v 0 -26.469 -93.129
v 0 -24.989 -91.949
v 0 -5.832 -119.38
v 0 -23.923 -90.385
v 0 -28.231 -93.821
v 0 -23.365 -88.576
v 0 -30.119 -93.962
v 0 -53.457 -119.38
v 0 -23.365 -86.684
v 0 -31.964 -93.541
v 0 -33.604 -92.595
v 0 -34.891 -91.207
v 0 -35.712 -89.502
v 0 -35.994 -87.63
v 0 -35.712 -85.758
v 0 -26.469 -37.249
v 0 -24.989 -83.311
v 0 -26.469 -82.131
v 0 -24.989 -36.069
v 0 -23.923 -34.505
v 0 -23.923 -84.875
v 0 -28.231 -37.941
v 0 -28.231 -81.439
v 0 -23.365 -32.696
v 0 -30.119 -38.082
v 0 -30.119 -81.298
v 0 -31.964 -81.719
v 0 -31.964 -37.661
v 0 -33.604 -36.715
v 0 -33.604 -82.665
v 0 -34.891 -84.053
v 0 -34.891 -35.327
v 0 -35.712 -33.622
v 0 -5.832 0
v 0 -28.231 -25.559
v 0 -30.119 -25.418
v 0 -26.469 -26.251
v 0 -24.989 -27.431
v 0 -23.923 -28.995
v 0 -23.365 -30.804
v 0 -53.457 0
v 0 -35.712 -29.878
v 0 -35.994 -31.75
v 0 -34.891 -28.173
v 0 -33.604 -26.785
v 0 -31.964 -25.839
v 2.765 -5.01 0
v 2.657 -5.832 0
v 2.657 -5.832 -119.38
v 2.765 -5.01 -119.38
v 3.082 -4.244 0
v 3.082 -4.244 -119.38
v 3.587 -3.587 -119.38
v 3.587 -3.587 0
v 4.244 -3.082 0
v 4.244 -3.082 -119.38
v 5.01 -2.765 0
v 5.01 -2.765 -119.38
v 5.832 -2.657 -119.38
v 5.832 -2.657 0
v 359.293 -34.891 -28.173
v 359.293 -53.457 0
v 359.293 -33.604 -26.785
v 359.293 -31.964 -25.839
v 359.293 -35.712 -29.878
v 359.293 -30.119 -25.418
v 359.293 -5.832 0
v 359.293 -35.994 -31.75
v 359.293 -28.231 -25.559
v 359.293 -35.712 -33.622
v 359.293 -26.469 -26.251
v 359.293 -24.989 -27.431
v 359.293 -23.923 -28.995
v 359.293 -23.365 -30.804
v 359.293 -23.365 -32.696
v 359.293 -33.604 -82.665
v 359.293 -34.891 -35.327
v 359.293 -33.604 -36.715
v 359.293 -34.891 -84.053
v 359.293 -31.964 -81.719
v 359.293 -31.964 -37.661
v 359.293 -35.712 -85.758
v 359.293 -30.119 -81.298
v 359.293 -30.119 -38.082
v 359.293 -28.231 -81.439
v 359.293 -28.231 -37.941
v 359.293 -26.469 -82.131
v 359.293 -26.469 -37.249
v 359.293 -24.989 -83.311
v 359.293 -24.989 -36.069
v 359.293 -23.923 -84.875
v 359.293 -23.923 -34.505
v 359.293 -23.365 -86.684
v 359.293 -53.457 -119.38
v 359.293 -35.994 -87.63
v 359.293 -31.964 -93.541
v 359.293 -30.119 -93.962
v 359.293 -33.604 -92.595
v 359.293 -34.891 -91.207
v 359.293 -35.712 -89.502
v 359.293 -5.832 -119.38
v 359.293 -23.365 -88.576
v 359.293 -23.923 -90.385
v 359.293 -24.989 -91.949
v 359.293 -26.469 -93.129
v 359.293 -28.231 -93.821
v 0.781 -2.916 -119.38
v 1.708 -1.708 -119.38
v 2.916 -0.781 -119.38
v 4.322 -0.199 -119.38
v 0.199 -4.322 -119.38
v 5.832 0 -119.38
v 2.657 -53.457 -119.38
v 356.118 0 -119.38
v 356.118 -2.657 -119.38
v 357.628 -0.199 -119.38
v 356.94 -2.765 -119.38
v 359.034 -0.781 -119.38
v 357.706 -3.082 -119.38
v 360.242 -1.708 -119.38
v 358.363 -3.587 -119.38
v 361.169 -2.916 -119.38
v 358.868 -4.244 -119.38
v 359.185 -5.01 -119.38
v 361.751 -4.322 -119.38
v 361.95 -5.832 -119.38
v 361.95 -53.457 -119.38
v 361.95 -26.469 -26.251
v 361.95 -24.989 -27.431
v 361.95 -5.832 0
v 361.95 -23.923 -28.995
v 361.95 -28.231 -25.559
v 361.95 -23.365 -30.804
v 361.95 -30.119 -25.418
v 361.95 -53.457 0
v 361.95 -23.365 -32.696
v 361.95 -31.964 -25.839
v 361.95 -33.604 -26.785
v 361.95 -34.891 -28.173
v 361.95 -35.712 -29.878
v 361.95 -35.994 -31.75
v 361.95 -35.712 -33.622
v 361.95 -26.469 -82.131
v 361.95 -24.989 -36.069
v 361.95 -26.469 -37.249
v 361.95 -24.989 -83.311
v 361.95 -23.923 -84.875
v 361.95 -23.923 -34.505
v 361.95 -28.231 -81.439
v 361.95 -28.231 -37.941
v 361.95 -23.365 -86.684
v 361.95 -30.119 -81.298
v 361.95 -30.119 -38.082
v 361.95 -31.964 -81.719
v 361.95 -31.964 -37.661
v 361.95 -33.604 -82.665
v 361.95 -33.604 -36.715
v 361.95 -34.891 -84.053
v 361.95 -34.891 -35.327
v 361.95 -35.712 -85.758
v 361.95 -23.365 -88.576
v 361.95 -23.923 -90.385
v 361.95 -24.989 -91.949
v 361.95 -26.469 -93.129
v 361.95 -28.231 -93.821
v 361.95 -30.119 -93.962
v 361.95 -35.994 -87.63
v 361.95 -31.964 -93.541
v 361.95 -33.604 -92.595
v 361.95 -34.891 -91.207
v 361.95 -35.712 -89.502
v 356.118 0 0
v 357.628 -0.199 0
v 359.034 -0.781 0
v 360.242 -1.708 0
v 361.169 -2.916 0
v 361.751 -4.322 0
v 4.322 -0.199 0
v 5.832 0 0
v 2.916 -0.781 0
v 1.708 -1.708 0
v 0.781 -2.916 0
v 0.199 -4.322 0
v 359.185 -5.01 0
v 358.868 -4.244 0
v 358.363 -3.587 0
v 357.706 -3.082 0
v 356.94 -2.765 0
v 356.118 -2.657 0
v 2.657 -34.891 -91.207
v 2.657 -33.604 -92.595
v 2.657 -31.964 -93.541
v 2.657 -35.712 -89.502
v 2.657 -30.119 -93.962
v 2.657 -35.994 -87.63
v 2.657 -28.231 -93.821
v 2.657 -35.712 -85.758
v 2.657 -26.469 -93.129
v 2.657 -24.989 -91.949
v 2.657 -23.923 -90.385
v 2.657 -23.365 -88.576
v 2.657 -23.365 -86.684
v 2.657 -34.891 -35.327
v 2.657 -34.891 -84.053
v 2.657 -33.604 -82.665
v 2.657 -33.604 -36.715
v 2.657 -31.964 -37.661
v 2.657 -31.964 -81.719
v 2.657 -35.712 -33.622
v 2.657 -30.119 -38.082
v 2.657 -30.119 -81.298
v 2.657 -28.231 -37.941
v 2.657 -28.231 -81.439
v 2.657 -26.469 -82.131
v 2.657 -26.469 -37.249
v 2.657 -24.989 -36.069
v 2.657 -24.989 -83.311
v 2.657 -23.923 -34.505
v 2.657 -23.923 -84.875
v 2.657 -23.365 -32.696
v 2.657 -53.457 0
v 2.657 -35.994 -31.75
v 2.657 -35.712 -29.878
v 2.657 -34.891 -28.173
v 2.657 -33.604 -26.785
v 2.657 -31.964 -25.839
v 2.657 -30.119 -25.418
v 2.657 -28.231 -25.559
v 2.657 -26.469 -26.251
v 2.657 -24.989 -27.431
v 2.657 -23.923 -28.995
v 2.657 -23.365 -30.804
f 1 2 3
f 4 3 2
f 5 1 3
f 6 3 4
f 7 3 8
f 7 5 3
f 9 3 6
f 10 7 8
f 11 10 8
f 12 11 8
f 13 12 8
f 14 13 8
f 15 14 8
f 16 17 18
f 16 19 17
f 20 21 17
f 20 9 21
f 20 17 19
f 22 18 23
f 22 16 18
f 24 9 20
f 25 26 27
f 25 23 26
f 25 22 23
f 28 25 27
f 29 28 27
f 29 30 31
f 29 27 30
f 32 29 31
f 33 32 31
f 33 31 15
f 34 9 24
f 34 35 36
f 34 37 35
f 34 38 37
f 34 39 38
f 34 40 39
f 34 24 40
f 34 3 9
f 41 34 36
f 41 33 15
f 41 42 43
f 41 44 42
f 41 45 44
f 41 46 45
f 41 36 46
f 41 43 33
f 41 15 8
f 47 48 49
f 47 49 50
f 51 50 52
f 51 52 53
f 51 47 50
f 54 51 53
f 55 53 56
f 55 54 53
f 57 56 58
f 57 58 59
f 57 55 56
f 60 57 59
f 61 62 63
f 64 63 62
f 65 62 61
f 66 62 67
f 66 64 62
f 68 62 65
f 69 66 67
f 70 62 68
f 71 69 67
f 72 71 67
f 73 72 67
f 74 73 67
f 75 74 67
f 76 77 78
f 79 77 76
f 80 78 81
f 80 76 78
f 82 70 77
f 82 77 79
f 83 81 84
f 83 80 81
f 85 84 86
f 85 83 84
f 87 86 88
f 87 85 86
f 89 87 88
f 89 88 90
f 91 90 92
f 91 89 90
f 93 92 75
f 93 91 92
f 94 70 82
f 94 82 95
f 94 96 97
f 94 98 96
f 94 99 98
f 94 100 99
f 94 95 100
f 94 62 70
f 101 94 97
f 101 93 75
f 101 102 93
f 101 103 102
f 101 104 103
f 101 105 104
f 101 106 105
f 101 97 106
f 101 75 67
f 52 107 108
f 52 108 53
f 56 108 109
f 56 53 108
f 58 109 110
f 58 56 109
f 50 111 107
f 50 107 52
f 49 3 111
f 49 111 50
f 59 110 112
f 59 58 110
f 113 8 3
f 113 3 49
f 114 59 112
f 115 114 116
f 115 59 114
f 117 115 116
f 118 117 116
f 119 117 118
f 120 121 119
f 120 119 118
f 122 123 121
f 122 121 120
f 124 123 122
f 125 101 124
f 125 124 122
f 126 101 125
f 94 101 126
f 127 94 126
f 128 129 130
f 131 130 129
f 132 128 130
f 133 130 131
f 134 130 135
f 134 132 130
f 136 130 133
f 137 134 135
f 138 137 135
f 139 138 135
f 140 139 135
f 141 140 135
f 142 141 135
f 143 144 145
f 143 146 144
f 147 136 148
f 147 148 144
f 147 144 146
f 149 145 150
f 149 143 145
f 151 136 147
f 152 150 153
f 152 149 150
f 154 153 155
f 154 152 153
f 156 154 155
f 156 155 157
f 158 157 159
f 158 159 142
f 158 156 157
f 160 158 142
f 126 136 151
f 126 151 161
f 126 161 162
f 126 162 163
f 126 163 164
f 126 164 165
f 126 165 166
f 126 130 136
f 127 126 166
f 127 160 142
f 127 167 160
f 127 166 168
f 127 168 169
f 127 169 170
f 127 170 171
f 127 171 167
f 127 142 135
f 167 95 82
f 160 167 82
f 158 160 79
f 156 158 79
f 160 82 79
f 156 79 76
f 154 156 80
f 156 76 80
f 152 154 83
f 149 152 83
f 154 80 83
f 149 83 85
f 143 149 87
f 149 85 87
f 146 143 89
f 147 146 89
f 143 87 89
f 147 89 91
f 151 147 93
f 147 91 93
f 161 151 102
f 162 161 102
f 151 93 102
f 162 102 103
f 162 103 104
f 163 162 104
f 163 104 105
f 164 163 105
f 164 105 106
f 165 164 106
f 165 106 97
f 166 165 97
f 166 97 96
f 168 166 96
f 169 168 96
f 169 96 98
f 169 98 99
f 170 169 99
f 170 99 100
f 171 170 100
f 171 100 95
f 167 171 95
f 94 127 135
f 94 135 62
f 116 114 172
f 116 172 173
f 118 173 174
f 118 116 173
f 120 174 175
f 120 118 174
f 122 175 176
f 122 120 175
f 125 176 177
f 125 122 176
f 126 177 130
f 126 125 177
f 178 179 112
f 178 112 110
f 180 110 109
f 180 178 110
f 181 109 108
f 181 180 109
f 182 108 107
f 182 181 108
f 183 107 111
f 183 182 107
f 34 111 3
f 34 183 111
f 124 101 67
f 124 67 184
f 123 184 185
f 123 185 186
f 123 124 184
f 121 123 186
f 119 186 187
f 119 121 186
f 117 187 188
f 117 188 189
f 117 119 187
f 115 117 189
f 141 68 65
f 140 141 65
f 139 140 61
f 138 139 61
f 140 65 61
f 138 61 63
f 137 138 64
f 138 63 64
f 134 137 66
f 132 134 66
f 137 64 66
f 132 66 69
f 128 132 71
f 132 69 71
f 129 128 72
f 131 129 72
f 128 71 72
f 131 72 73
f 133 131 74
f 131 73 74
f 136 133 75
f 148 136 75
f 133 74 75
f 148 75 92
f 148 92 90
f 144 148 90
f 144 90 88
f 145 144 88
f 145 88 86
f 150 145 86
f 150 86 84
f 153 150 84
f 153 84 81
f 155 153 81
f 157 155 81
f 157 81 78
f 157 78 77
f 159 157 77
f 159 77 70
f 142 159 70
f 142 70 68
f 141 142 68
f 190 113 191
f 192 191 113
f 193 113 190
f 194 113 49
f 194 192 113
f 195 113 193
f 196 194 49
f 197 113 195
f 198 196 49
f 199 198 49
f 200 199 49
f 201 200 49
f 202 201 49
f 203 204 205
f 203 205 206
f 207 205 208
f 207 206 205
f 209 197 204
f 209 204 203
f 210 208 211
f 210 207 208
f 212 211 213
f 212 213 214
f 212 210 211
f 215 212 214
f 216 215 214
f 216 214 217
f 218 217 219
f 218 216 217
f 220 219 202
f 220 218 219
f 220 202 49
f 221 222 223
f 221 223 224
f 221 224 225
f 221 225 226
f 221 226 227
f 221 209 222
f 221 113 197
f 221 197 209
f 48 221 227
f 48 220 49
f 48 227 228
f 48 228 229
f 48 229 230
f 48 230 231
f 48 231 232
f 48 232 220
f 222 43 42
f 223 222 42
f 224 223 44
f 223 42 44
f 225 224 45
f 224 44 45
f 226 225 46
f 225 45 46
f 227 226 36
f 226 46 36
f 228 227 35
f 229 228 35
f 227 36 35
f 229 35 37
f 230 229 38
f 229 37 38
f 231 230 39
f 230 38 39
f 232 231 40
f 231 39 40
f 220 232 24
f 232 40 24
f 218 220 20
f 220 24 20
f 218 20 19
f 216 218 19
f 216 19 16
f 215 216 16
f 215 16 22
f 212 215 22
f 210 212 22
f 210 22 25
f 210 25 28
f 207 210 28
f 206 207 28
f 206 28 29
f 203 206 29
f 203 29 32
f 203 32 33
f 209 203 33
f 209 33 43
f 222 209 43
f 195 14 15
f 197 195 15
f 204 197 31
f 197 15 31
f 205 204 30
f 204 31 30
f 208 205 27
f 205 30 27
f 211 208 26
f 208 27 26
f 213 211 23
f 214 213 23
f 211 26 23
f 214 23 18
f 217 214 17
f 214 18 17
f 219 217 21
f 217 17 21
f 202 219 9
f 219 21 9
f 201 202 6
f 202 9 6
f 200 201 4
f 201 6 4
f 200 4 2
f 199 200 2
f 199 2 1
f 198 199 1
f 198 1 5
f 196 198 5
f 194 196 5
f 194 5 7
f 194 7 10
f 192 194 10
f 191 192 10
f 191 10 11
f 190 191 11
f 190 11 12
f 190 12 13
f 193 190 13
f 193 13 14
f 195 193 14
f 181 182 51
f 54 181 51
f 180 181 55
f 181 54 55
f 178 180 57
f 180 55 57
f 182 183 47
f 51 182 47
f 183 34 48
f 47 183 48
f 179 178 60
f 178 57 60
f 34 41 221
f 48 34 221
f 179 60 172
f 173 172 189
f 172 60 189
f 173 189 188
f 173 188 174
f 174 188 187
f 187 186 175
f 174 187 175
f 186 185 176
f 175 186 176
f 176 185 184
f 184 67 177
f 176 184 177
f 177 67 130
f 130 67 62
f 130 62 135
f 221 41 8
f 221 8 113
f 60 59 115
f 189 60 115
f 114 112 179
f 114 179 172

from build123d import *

# Parameters (mm, degrees)
SKETCH1_W                    = 361.95
SKETCH1_H                    = 119.38
BASE_FLANGE1_DEPTH           = 2.65684
EDGE_FLANGE1_STRIP_W         = 16.97736
EDGE_FLANGE1_STRIP_H         = 2.65684
EDGE_FLANGE1_STRIP_CUT_DEPTH = 119.38
EDGE_FLANGE1_DEPTH           = 119.38
EDGE_FLANGE2_STRIP_W         = 16.97736
EDGE_FLANGE2_STRIP_H         = 2.65684
EDGE_FLANGE2_STRIP_CUT_DEPTH = 119.38
EDGE_FLANGE2_DEPTH           = 119.38
SKETCH12_R                   = 6.35
CUT_EXTRUDE1_DEPTH           = 385.85974152


# Sheet-metal steps are written as plain solids
with BuildPart() as part:
    # Sketch1 → Base-Flange1 (new body)
    with BuildSketch(Plane(origin=(0, 0, 0), x_dir=(1, 0, 0), z_dir=(0, 1, 0))):
        with Locations((180.975, 59.69)):
            Rectangle(SKETCH1_W, SKETCH1_H)
    extrude(amount=-BASE_FLANGE1_DEPTH)

    # Edge-Flange1 strip (across the edge) → Edge-Flange1 strip cut (cut)
    with BuildSketch(Plane(origin=(0, -2.65684, 0), x_dir=(1, 0, 0), z_dir=(0, 0, -1))):
        with Locations((-2.65684, -1.32842)):
            Rectangle(EDGE_FLANGE1_STRIP_W, EDGE_FLANGE1_STRIP_H)
    extrude(amount=EDGE_FLANGE1_STRIP_CUT_DEPTH, mode=Mode.SUBTRACT)

    # Edge-Flange1 section (across the edge) → Edge-Flange1 (add)
    with BuildSketch(Plane(origin=(0, -2.65684, 0), x_dir=(1, 0, 0), z_dir=(0, 0, -1))):
        with BuildLine():
            Line((0, 3.175), (0, 50.8))
            Line((0, 50.8), (2.65684, 50.8))
            Line((2.65684, 50.8), (2.65684, 3.175))
            ThreePointArc((2.65684, 3.175), (3.58677597, 0.92993597), (5.83184, 0))
            Line((5.83184, 0), (5.83184, -2.65684))
            ThreePointArc((5.83184, -2.65684), (1.708106389, -0.948733611), (0, 3.175))
        make_face()
    extrude(amount=EDGE_FLANGE1_DEPTH)

    # Edge-Flange2 strip (across the edge) → Edge-Flange2 strip cut (cut)
    with BuildSketch(Plane(origin=(361.95, -2.65684, -119.38), x_dir=(-1, 0, 0), z_dir=(0, 0, 1))):
        with Locations((-2.65684, -1.32842)):
            Rectangle(EDGE_FLANGE2_STRIP_W, EDGE_FLANGE2_STRIP_H)
    extrude(amount=EDGE_FLANGE2_STRIP_CUT_DEPTH, mode=Mode.SUBTRACT)

    # Edge-Flange2 section (across the edge) → Edge-Flange2 (add)
    with BuildSketch(Plane(origin=(361.95, -2.65684, -119.38), x_dir=(-1, 0, 0), z_dir=(0, 0, 1))):
        with BuildLine():
            Line((0, 3.175), (0, 50.8))
            Line((0, 50.8), (2.65684, 50.8))
            Line((2.65684, 50.8), (2.65684, 3.175))
            ThreePointArc((2.65684, 3.175), (3.58677597, 0.92993597), (5.83184, 0))
            Line((5.83184, 0), (5.83184, -2.65684))
            ThreePointArc((5.83184, -2.65684), (1.708106389, -0.948733611), (0, 3.175))
        make_face()
    extrude(amount=EDGE_FLANGE2_DEPTH)

    # Sketch12 → Cut-Extrude1 (cut, through all)
    with BuildSketch(Plane.ZY):
        with Locations(Location((-87.63, -29.64434, 0), (0, 0, 270))):
            Circle(SKETCH12_R)
        with Locations(Location((-31.75, -29.64434, 0), (0, 0, 270))):
            Circle(SKETCH12_R)
    extrude(amount=-CUT_EXTRUDE1_DEPTH, mode=Mode.SUBTRACT)


solid = part.part
